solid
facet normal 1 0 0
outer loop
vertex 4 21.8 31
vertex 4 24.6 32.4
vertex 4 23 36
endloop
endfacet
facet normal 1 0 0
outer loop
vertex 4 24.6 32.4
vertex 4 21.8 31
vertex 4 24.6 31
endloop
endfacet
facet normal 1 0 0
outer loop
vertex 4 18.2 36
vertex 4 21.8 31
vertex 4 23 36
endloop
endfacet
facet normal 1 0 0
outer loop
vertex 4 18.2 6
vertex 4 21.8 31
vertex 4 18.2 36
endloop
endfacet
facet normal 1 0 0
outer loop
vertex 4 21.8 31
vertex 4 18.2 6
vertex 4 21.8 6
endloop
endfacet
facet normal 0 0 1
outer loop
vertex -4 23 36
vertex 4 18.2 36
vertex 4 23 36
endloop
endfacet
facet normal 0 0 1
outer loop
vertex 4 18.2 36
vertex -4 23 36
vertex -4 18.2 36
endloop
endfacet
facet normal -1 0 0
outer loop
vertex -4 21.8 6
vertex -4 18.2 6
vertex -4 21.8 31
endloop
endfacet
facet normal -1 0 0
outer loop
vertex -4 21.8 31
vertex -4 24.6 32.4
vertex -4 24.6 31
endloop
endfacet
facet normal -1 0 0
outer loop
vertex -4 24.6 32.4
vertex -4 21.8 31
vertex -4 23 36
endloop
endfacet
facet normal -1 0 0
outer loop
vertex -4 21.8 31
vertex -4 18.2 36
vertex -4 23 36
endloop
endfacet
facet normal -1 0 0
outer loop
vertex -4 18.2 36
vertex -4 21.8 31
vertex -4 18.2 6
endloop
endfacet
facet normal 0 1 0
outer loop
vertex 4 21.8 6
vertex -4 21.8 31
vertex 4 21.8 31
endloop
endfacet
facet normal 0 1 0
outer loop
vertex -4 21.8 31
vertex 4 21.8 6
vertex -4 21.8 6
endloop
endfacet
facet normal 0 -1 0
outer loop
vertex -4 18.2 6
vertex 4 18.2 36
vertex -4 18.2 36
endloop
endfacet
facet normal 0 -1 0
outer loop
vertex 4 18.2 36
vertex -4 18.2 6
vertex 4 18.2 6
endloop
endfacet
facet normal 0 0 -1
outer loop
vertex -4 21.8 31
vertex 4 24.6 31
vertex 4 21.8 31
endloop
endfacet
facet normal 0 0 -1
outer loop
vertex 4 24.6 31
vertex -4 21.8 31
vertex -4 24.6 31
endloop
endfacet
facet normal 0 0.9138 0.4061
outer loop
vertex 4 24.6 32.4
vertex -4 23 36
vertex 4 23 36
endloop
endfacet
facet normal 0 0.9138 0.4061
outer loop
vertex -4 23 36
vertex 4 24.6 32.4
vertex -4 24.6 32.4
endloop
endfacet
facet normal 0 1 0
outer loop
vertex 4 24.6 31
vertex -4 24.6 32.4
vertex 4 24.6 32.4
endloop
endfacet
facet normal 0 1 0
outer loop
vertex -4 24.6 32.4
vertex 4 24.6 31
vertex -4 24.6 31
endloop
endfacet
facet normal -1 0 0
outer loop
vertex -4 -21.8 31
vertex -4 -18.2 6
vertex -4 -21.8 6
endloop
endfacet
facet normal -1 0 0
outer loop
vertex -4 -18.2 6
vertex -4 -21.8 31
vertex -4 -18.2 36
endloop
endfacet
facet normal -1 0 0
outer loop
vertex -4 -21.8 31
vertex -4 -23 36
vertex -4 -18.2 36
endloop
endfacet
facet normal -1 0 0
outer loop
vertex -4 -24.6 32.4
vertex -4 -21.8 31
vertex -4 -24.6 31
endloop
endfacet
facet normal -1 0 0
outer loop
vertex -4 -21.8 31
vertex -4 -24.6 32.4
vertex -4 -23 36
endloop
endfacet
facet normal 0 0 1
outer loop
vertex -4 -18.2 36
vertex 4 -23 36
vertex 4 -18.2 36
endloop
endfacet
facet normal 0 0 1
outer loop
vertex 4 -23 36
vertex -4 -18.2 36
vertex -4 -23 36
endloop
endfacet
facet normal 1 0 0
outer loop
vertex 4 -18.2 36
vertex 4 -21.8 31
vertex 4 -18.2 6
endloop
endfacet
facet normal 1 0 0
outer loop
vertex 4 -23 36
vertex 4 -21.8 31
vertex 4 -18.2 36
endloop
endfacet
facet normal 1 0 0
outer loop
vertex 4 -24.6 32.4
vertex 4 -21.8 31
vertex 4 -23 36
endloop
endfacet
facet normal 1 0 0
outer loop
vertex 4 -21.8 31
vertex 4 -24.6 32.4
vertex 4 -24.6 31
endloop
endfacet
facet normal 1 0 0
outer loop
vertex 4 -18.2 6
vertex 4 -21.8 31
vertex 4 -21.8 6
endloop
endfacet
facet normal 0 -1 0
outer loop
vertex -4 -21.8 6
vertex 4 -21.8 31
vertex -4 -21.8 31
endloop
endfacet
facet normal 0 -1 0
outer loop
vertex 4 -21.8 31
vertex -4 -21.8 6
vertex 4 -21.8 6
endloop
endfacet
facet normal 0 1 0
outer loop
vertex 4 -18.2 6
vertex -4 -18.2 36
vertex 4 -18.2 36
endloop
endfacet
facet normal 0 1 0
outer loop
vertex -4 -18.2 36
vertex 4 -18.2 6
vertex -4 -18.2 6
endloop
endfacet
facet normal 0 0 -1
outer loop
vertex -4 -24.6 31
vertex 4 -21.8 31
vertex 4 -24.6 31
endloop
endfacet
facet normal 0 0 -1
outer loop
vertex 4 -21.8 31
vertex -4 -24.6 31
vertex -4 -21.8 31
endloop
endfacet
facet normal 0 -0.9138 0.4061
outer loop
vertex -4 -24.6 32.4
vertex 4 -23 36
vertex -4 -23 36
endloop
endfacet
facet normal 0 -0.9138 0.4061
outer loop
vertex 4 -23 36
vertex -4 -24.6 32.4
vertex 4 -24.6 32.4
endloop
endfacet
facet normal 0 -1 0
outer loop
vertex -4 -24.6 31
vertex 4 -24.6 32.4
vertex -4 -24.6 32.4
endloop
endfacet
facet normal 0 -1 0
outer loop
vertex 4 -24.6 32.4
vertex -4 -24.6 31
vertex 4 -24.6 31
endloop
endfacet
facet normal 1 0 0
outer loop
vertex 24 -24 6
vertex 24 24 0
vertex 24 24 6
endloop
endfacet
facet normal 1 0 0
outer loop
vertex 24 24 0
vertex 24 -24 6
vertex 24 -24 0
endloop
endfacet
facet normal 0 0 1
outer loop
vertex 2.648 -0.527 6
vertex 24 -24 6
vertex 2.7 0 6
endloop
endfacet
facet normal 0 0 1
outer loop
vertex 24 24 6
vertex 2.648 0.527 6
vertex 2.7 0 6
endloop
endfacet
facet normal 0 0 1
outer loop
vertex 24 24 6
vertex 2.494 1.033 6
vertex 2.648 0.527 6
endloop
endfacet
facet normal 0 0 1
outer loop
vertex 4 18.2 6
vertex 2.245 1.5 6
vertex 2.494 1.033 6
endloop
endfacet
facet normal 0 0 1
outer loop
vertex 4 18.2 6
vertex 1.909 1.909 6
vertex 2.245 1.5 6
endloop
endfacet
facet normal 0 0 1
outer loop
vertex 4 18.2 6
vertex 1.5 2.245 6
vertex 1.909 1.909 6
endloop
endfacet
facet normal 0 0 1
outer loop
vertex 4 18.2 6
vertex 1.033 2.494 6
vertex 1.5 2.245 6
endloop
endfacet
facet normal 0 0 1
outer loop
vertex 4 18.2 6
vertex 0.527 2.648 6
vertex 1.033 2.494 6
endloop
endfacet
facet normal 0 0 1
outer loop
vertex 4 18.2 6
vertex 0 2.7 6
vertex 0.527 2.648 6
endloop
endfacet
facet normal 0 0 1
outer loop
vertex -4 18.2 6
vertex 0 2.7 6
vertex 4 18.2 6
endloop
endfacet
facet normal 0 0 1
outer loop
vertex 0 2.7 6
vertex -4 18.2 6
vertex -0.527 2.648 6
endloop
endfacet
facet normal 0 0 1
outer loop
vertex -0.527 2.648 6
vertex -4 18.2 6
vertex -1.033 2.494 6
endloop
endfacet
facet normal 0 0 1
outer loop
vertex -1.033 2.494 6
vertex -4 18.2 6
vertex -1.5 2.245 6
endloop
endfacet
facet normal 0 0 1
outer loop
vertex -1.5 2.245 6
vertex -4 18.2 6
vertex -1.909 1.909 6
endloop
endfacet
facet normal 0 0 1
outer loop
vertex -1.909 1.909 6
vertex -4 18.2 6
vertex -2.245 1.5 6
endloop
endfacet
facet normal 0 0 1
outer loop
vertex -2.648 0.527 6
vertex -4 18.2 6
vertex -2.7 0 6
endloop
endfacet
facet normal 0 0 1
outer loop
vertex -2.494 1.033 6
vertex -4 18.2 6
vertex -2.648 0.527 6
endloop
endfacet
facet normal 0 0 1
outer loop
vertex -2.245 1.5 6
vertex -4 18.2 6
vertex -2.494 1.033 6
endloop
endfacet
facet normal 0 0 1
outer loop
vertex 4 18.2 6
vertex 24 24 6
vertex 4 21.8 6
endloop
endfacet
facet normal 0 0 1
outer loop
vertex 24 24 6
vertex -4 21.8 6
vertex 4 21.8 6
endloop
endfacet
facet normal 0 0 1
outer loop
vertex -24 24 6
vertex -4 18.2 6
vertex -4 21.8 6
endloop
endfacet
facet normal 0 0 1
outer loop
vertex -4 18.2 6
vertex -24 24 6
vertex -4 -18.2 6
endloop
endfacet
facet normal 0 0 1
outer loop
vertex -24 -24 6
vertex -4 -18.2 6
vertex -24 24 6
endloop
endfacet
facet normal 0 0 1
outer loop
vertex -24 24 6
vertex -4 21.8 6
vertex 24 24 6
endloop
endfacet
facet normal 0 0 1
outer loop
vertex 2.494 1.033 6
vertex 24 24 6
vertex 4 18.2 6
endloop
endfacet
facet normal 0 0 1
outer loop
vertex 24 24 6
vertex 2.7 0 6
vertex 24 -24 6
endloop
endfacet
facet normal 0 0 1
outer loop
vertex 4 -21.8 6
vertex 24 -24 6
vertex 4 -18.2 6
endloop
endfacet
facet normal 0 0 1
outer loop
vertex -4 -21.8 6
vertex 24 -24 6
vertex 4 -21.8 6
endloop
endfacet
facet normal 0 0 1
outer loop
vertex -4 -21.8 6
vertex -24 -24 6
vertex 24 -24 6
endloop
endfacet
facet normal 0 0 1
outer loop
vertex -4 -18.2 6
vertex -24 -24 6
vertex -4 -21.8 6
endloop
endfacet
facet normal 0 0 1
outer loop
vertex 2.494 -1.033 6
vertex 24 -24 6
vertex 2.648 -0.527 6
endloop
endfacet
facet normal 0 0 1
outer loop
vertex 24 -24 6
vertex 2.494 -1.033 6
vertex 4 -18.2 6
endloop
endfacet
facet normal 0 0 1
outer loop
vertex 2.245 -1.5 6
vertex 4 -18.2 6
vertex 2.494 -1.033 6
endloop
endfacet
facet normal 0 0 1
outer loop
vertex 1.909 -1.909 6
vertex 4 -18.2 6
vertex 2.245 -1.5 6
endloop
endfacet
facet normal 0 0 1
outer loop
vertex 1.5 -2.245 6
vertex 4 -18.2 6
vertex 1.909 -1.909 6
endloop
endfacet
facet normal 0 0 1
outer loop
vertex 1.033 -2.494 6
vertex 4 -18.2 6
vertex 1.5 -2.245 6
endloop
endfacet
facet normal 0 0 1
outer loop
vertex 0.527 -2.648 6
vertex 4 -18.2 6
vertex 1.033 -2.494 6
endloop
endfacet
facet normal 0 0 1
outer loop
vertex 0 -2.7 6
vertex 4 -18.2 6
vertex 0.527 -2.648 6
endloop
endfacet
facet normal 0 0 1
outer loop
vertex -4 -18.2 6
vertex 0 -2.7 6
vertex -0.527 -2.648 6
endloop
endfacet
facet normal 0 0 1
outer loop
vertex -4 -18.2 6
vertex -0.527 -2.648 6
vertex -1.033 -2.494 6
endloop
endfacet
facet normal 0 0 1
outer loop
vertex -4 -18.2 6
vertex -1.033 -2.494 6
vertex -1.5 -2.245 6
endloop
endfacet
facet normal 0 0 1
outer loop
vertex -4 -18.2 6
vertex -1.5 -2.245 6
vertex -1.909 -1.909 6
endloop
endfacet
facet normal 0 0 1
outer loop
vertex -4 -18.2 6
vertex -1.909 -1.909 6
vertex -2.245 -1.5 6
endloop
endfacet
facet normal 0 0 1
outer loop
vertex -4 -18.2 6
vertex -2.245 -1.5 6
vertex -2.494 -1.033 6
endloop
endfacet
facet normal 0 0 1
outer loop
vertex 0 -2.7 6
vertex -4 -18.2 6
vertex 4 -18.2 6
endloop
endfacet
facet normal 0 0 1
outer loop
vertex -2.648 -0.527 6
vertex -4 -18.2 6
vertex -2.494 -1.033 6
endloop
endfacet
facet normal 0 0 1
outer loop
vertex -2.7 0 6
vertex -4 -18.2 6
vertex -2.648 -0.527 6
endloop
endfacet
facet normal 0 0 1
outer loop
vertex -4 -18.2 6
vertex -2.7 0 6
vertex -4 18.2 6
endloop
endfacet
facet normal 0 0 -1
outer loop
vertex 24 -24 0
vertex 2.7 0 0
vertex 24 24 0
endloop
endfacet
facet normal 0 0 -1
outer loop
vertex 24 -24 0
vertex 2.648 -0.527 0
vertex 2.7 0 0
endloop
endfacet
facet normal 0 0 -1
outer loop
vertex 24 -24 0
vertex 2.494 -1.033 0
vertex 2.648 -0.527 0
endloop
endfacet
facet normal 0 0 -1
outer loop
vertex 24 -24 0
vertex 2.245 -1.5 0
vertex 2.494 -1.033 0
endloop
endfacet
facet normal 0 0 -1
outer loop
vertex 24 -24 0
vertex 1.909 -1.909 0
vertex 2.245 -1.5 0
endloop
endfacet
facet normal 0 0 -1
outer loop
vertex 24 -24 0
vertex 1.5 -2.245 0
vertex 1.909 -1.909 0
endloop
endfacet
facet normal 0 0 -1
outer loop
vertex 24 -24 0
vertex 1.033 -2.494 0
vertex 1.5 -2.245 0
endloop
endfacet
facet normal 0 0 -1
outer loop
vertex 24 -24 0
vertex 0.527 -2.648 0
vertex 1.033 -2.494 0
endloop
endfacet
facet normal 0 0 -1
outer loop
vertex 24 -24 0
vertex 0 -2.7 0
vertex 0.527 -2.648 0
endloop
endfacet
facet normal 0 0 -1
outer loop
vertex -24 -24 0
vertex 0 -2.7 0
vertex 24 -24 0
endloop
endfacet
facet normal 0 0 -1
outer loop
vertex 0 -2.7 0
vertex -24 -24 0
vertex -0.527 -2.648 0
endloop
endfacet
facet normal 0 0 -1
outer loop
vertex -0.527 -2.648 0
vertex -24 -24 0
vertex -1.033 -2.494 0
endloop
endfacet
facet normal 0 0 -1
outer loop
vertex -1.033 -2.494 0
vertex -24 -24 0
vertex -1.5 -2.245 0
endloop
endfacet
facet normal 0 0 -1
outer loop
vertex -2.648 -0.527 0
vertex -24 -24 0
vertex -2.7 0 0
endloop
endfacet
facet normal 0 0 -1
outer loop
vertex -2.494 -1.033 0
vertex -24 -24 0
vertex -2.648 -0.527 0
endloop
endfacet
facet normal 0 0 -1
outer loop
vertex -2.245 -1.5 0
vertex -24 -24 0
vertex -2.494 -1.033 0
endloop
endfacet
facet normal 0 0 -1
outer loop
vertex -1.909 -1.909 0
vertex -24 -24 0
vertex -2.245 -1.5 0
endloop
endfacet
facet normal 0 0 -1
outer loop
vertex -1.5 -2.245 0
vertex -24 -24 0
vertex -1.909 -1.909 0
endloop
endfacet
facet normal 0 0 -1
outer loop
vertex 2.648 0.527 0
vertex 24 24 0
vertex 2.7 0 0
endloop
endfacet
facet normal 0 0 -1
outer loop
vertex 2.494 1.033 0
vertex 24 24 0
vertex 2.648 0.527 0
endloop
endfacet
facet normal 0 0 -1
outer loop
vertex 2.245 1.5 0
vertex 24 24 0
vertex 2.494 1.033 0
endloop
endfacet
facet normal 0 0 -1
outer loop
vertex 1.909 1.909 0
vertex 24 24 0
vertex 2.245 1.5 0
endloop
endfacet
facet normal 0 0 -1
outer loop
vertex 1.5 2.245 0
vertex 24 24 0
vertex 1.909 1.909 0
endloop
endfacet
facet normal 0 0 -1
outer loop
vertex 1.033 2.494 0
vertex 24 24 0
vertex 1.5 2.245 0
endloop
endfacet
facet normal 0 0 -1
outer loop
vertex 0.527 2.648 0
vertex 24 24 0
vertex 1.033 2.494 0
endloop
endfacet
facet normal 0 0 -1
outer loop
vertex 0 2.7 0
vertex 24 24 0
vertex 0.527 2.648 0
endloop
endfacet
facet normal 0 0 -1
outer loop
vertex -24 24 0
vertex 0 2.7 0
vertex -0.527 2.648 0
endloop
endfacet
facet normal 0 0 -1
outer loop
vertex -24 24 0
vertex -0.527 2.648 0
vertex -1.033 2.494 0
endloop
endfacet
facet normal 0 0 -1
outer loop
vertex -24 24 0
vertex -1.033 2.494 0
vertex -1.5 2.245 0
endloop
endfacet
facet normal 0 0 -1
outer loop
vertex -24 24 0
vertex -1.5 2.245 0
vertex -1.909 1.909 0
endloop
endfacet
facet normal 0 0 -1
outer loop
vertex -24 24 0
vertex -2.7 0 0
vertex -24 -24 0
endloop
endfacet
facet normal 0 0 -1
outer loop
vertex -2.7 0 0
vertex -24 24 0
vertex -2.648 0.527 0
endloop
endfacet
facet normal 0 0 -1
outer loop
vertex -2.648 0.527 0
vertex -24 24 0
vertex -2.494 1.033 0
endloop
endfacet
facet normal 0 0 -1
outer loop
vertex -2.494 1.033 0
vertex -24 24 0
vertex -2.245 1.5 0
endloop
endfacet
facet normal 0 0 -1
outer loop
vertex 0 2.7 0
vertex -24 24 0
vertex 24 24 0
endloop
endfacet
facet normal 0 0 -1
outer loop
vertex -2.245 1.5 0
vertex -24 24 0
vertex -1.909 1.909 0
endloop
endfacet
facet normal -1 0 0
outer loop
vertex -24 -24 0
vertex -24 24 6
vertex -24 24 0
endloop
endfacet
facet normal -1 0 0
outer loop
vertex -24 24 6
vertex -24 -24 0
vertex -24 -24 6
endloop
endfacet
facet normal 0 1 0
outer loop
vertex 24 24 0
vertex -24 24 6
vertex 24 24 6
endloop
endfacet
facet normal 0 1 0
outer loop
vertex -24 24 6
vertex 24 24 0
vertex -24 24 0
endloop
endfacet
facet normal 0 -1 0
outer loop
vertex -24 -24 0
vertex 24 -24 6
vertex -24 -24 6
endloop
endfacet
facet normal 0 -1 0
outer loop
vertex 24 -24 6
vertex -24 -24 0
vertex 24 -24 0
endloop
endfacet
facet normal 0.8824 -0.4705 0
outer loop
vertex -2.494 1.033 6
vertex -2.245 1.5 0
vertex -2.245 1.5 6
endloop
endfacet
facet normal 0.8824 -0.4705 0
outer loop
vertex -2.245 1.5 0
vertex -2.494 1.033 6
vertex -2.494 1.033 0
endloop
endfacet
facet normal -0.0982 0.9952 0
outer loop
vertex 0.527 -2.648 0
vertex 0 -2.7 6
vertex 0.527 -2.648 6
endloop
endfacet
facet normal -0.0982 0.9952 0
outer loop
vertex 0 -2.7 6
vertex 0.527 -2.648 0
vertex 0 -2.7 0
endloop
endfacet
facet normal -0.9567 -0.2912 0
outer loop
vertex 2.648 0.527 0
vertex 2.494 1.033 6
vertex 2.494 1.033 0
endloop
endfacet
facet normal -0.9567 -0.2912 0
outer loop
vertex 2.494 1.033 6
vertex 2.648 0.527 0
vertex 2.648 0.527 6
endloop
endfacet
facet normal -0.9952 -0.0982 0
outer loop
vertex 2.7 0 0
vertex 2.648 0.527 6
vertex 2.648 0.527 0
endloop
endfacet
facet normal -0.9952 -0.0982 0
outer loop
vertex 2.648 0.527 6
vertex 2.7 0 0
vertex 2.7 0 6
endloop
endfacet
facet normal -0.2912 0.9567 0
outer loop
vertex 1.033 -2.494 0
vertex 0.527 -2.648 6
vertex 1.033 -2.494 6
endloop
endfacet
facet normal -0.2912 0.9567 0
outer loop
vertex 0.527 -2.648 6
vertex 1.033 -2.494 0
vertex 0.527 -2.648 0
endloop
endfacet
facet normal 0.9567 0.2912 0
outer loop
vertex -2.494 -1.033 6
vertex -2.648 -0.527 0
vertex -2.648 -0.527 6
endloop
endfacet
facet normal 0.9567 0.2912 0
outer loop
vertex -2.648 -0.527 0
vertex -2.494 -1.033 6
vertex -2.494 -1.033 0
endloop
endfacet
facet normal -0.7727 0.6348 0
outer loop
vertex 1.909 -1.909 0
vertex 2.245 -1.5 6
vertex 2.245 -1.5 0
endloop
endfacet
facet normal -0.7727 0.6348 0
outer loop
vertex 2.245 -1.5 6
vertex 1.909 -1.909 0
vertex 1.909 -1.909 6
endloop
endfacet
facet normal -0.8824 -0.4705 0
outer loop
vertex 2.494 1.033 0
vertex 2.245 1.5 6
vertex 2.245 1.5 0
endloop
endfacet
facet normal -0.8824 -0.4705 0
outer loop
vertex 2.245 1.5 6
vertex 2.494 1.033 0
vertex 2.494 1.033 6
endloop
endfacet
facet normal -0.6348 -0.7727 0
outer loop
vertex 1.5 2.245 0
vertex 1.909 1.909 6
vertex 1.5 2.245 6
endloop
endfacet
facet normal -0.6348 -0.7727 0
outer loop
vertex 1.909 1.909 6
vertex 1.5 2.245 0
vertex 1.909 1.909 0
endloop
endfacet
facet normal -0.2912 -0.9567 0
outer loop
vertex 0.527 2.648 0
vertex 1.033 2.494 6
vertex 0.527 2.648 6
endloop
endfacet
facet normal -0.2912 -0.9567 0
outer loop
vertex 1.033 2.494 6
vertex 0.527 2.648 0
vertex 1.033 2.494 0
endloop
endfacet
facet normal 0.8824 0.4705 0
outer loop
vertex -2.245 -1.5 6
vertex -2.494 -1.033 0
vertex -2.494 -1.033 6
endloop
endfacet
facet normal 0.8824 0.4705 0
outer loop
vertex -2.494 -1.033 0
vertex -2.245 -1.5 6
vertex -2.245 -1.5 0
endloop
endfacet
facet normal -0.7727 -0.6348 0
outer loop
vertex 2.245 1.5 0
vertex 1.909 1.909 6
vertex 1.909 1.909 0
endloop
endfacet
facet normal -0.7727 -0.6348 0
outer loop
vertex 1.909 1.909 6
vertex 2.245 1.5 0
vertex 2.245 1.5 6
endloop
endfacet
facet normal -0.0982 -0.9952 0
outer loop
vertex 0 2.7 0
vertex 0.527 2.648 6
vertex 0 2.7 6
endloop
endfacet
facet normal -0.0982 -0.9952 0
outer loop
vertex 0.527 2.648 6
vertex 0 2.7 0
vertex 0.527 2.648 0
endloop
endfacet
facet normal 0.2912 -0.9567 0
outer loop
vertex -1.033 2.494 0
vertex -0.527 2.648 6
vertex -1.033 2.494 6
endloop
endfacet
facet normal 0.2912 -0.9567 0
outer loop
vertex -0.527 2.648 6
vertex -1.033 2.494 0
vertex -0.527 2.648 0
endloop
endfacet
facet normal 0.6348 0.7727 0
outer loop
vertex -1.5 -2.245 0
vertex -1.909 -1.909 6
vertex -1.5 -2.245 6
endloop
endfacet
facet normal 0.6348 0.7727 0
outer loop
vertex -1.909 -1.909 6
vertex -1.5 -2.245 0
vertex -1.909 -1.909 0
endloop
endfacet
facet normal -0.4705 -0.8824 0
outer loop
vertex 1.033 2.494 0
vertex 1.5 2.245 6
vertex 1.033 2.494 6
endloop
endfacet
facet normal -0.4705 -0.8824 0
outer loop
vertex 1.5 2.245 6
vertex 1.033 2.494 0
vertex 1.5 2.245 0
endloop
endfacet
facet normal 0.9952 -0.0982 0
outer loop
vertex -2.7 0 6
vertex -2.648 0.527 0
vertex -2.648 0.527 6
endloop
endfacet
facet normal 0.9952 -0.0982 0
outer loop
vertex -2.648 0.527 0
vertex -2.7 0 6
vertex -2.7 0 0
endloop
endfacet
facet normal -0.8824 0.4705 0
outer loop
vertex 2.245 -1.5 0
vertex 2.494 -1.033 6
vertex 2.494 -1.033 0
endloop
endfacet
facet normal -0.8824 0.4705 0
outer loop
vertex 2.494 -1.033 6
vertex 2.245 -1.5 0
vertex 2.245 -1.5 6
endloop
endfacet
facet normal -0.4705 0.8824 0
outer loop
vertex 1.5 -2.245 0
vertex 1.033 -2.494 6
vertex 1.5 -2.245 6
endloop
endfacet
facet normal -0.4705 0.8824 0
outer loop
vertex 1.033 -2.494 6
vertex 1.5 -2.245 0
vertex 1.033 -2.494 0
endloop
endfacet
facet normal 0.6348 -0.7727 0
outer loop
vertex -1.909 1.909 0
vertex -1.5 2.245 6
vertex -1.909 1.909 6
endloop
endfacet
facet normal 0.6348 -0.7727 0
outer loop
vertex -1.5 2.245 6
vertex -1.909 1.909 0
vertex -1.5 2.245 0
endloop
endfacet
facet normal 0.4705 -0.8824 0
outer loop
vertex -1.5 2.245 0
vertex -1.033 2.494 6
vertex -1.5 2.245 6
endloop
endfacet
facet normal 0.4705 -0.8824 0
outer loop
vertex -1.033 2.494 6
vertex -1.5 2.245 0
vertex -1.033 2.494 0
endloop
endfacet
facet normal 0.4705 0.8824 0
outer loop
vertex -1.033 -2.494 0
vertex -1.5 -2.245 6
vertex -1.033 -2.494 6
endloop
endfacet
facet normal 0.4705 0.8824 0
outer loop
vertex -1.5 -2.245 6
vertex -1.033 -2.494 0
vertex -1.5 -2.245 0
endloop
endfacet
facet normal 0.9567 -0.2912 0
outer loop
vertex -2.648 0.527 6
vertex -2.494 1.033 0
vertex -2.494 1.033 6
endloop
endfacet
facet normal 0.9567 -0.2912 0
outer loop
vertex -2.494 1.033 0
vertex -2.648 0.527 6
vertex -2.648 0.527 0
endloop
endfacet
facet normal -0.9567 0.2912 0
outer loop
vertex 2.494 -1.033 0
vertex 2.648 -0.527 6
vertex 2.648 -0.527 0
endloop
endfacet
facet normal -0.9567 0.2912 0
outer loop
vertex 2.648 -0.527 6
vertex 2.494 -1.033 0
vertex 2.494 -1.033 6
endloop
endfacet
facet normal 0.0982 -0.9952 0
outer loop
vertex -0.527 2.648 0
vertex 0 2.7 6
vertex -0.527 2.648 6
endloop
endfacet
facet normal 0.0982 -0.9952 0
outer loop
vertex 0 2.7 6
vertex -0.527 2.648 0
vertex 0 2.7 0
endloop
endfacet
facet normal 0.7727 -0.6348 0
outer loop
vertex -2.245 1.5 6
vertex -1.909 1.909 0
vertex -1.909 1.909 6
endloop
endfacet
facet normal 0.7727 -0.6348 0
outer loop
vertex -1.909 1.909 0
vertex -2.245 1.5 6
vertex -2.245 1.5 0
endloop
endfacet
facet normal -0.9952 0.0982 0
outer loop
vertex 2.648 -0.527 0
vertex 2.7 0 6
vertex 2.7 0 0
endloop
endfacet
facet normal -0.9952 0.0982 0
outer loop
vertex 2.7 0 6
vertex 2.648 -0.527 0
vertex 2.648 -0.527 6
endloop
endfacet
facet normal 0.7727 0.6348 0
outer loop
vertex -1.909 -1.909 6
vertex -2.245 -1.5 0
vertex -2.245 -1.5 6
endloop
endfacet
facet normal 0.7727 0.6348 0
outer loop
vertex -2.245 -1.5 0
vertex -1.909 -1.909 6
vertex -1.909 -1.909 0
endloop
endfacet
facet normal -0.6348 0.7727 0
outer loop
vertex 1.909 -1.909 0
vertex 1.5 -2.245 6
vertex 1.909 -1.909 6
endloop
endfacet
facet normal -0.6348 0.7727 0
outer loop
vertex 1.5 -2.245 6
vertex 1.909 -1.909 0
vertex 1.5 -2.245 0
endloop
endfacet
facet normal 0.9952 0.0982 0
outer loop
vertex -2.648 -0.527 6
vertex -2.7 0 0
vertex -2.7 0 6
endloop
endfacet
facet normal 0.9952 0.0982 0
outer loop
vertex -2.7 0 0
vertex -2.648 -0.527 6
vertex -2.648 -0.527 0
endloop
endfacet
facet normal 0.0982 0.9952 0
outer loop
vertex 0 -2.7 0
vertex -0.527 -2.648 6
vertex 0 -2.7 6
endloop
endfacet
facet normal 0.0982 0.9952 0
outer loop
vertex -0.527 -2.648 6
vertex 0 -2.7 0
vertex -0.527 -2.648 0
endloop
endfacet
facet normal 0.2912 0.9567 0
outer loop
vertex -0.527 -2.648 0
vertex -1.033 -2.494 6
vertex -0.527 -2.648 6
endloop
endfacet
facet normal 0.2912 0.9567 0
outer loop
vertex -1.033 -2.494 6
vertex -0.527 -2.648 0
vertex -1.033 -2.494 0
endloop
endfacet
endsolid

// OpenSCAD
$fn = 32;

// ----------------------------------------------------------------------
// Snap-fit latch: 2 arms, 30 mm tall, 3 mm undercut hooks
// ----------------------------------------------------------------------

// --- parameters (mm) ---
base_d = 48;              // base plate depth
base_h = 6;               // base plate thickness
span = 40;                // distance between opposite arms
arm_t = 3.6;              // arm thickness
arm_d = 8;                // arm width
height = 30;              // free arm length
head_len = 3;             // hook reach
head_h = 5;               // hook height
lead = 1.4;               // lead-in ramp thickness
bore_d = 5.4;             // base fixing bore
top_z = 36;               // height of the arm tips above the base

arms = 2;

difference() {
  union() {
    /* base plate, centred on the arm ring */
    translate([-24, -24, 0]) cube([base_d, base_d, base_h]);
    for (a = [0 : 360 / arms : 359]) rotate([0, 0, a]) {
    /* arm, sunk 0.5 mm into the base */
    translate([-arm_d / 2, span / 2 - arm_t / 2, base_h - 0.5]) cube([arm_d, arm_t, height + 0.5]);
    /* hook: a convex hull of a tall inner block and a thin outer lip
       gives a flat undercut below and a lead-in ramp on top */
    hull() {
      translate([-arm_d / 2, span / 2 + arm_t / 2 - 0.6, top_z - head_h]) cube([arm_d, lead + 0.4, head_h]);
      translate([-arm_d / 2, span / 2 + arm_t / 2 - 0.2, top_z - head_h]) cube([arm_d, head_len, lead]);
    }
    }
  }
  translate([0, 0, -2.5]) cylinder(h = base_h + 5, d = bore_d);
}
